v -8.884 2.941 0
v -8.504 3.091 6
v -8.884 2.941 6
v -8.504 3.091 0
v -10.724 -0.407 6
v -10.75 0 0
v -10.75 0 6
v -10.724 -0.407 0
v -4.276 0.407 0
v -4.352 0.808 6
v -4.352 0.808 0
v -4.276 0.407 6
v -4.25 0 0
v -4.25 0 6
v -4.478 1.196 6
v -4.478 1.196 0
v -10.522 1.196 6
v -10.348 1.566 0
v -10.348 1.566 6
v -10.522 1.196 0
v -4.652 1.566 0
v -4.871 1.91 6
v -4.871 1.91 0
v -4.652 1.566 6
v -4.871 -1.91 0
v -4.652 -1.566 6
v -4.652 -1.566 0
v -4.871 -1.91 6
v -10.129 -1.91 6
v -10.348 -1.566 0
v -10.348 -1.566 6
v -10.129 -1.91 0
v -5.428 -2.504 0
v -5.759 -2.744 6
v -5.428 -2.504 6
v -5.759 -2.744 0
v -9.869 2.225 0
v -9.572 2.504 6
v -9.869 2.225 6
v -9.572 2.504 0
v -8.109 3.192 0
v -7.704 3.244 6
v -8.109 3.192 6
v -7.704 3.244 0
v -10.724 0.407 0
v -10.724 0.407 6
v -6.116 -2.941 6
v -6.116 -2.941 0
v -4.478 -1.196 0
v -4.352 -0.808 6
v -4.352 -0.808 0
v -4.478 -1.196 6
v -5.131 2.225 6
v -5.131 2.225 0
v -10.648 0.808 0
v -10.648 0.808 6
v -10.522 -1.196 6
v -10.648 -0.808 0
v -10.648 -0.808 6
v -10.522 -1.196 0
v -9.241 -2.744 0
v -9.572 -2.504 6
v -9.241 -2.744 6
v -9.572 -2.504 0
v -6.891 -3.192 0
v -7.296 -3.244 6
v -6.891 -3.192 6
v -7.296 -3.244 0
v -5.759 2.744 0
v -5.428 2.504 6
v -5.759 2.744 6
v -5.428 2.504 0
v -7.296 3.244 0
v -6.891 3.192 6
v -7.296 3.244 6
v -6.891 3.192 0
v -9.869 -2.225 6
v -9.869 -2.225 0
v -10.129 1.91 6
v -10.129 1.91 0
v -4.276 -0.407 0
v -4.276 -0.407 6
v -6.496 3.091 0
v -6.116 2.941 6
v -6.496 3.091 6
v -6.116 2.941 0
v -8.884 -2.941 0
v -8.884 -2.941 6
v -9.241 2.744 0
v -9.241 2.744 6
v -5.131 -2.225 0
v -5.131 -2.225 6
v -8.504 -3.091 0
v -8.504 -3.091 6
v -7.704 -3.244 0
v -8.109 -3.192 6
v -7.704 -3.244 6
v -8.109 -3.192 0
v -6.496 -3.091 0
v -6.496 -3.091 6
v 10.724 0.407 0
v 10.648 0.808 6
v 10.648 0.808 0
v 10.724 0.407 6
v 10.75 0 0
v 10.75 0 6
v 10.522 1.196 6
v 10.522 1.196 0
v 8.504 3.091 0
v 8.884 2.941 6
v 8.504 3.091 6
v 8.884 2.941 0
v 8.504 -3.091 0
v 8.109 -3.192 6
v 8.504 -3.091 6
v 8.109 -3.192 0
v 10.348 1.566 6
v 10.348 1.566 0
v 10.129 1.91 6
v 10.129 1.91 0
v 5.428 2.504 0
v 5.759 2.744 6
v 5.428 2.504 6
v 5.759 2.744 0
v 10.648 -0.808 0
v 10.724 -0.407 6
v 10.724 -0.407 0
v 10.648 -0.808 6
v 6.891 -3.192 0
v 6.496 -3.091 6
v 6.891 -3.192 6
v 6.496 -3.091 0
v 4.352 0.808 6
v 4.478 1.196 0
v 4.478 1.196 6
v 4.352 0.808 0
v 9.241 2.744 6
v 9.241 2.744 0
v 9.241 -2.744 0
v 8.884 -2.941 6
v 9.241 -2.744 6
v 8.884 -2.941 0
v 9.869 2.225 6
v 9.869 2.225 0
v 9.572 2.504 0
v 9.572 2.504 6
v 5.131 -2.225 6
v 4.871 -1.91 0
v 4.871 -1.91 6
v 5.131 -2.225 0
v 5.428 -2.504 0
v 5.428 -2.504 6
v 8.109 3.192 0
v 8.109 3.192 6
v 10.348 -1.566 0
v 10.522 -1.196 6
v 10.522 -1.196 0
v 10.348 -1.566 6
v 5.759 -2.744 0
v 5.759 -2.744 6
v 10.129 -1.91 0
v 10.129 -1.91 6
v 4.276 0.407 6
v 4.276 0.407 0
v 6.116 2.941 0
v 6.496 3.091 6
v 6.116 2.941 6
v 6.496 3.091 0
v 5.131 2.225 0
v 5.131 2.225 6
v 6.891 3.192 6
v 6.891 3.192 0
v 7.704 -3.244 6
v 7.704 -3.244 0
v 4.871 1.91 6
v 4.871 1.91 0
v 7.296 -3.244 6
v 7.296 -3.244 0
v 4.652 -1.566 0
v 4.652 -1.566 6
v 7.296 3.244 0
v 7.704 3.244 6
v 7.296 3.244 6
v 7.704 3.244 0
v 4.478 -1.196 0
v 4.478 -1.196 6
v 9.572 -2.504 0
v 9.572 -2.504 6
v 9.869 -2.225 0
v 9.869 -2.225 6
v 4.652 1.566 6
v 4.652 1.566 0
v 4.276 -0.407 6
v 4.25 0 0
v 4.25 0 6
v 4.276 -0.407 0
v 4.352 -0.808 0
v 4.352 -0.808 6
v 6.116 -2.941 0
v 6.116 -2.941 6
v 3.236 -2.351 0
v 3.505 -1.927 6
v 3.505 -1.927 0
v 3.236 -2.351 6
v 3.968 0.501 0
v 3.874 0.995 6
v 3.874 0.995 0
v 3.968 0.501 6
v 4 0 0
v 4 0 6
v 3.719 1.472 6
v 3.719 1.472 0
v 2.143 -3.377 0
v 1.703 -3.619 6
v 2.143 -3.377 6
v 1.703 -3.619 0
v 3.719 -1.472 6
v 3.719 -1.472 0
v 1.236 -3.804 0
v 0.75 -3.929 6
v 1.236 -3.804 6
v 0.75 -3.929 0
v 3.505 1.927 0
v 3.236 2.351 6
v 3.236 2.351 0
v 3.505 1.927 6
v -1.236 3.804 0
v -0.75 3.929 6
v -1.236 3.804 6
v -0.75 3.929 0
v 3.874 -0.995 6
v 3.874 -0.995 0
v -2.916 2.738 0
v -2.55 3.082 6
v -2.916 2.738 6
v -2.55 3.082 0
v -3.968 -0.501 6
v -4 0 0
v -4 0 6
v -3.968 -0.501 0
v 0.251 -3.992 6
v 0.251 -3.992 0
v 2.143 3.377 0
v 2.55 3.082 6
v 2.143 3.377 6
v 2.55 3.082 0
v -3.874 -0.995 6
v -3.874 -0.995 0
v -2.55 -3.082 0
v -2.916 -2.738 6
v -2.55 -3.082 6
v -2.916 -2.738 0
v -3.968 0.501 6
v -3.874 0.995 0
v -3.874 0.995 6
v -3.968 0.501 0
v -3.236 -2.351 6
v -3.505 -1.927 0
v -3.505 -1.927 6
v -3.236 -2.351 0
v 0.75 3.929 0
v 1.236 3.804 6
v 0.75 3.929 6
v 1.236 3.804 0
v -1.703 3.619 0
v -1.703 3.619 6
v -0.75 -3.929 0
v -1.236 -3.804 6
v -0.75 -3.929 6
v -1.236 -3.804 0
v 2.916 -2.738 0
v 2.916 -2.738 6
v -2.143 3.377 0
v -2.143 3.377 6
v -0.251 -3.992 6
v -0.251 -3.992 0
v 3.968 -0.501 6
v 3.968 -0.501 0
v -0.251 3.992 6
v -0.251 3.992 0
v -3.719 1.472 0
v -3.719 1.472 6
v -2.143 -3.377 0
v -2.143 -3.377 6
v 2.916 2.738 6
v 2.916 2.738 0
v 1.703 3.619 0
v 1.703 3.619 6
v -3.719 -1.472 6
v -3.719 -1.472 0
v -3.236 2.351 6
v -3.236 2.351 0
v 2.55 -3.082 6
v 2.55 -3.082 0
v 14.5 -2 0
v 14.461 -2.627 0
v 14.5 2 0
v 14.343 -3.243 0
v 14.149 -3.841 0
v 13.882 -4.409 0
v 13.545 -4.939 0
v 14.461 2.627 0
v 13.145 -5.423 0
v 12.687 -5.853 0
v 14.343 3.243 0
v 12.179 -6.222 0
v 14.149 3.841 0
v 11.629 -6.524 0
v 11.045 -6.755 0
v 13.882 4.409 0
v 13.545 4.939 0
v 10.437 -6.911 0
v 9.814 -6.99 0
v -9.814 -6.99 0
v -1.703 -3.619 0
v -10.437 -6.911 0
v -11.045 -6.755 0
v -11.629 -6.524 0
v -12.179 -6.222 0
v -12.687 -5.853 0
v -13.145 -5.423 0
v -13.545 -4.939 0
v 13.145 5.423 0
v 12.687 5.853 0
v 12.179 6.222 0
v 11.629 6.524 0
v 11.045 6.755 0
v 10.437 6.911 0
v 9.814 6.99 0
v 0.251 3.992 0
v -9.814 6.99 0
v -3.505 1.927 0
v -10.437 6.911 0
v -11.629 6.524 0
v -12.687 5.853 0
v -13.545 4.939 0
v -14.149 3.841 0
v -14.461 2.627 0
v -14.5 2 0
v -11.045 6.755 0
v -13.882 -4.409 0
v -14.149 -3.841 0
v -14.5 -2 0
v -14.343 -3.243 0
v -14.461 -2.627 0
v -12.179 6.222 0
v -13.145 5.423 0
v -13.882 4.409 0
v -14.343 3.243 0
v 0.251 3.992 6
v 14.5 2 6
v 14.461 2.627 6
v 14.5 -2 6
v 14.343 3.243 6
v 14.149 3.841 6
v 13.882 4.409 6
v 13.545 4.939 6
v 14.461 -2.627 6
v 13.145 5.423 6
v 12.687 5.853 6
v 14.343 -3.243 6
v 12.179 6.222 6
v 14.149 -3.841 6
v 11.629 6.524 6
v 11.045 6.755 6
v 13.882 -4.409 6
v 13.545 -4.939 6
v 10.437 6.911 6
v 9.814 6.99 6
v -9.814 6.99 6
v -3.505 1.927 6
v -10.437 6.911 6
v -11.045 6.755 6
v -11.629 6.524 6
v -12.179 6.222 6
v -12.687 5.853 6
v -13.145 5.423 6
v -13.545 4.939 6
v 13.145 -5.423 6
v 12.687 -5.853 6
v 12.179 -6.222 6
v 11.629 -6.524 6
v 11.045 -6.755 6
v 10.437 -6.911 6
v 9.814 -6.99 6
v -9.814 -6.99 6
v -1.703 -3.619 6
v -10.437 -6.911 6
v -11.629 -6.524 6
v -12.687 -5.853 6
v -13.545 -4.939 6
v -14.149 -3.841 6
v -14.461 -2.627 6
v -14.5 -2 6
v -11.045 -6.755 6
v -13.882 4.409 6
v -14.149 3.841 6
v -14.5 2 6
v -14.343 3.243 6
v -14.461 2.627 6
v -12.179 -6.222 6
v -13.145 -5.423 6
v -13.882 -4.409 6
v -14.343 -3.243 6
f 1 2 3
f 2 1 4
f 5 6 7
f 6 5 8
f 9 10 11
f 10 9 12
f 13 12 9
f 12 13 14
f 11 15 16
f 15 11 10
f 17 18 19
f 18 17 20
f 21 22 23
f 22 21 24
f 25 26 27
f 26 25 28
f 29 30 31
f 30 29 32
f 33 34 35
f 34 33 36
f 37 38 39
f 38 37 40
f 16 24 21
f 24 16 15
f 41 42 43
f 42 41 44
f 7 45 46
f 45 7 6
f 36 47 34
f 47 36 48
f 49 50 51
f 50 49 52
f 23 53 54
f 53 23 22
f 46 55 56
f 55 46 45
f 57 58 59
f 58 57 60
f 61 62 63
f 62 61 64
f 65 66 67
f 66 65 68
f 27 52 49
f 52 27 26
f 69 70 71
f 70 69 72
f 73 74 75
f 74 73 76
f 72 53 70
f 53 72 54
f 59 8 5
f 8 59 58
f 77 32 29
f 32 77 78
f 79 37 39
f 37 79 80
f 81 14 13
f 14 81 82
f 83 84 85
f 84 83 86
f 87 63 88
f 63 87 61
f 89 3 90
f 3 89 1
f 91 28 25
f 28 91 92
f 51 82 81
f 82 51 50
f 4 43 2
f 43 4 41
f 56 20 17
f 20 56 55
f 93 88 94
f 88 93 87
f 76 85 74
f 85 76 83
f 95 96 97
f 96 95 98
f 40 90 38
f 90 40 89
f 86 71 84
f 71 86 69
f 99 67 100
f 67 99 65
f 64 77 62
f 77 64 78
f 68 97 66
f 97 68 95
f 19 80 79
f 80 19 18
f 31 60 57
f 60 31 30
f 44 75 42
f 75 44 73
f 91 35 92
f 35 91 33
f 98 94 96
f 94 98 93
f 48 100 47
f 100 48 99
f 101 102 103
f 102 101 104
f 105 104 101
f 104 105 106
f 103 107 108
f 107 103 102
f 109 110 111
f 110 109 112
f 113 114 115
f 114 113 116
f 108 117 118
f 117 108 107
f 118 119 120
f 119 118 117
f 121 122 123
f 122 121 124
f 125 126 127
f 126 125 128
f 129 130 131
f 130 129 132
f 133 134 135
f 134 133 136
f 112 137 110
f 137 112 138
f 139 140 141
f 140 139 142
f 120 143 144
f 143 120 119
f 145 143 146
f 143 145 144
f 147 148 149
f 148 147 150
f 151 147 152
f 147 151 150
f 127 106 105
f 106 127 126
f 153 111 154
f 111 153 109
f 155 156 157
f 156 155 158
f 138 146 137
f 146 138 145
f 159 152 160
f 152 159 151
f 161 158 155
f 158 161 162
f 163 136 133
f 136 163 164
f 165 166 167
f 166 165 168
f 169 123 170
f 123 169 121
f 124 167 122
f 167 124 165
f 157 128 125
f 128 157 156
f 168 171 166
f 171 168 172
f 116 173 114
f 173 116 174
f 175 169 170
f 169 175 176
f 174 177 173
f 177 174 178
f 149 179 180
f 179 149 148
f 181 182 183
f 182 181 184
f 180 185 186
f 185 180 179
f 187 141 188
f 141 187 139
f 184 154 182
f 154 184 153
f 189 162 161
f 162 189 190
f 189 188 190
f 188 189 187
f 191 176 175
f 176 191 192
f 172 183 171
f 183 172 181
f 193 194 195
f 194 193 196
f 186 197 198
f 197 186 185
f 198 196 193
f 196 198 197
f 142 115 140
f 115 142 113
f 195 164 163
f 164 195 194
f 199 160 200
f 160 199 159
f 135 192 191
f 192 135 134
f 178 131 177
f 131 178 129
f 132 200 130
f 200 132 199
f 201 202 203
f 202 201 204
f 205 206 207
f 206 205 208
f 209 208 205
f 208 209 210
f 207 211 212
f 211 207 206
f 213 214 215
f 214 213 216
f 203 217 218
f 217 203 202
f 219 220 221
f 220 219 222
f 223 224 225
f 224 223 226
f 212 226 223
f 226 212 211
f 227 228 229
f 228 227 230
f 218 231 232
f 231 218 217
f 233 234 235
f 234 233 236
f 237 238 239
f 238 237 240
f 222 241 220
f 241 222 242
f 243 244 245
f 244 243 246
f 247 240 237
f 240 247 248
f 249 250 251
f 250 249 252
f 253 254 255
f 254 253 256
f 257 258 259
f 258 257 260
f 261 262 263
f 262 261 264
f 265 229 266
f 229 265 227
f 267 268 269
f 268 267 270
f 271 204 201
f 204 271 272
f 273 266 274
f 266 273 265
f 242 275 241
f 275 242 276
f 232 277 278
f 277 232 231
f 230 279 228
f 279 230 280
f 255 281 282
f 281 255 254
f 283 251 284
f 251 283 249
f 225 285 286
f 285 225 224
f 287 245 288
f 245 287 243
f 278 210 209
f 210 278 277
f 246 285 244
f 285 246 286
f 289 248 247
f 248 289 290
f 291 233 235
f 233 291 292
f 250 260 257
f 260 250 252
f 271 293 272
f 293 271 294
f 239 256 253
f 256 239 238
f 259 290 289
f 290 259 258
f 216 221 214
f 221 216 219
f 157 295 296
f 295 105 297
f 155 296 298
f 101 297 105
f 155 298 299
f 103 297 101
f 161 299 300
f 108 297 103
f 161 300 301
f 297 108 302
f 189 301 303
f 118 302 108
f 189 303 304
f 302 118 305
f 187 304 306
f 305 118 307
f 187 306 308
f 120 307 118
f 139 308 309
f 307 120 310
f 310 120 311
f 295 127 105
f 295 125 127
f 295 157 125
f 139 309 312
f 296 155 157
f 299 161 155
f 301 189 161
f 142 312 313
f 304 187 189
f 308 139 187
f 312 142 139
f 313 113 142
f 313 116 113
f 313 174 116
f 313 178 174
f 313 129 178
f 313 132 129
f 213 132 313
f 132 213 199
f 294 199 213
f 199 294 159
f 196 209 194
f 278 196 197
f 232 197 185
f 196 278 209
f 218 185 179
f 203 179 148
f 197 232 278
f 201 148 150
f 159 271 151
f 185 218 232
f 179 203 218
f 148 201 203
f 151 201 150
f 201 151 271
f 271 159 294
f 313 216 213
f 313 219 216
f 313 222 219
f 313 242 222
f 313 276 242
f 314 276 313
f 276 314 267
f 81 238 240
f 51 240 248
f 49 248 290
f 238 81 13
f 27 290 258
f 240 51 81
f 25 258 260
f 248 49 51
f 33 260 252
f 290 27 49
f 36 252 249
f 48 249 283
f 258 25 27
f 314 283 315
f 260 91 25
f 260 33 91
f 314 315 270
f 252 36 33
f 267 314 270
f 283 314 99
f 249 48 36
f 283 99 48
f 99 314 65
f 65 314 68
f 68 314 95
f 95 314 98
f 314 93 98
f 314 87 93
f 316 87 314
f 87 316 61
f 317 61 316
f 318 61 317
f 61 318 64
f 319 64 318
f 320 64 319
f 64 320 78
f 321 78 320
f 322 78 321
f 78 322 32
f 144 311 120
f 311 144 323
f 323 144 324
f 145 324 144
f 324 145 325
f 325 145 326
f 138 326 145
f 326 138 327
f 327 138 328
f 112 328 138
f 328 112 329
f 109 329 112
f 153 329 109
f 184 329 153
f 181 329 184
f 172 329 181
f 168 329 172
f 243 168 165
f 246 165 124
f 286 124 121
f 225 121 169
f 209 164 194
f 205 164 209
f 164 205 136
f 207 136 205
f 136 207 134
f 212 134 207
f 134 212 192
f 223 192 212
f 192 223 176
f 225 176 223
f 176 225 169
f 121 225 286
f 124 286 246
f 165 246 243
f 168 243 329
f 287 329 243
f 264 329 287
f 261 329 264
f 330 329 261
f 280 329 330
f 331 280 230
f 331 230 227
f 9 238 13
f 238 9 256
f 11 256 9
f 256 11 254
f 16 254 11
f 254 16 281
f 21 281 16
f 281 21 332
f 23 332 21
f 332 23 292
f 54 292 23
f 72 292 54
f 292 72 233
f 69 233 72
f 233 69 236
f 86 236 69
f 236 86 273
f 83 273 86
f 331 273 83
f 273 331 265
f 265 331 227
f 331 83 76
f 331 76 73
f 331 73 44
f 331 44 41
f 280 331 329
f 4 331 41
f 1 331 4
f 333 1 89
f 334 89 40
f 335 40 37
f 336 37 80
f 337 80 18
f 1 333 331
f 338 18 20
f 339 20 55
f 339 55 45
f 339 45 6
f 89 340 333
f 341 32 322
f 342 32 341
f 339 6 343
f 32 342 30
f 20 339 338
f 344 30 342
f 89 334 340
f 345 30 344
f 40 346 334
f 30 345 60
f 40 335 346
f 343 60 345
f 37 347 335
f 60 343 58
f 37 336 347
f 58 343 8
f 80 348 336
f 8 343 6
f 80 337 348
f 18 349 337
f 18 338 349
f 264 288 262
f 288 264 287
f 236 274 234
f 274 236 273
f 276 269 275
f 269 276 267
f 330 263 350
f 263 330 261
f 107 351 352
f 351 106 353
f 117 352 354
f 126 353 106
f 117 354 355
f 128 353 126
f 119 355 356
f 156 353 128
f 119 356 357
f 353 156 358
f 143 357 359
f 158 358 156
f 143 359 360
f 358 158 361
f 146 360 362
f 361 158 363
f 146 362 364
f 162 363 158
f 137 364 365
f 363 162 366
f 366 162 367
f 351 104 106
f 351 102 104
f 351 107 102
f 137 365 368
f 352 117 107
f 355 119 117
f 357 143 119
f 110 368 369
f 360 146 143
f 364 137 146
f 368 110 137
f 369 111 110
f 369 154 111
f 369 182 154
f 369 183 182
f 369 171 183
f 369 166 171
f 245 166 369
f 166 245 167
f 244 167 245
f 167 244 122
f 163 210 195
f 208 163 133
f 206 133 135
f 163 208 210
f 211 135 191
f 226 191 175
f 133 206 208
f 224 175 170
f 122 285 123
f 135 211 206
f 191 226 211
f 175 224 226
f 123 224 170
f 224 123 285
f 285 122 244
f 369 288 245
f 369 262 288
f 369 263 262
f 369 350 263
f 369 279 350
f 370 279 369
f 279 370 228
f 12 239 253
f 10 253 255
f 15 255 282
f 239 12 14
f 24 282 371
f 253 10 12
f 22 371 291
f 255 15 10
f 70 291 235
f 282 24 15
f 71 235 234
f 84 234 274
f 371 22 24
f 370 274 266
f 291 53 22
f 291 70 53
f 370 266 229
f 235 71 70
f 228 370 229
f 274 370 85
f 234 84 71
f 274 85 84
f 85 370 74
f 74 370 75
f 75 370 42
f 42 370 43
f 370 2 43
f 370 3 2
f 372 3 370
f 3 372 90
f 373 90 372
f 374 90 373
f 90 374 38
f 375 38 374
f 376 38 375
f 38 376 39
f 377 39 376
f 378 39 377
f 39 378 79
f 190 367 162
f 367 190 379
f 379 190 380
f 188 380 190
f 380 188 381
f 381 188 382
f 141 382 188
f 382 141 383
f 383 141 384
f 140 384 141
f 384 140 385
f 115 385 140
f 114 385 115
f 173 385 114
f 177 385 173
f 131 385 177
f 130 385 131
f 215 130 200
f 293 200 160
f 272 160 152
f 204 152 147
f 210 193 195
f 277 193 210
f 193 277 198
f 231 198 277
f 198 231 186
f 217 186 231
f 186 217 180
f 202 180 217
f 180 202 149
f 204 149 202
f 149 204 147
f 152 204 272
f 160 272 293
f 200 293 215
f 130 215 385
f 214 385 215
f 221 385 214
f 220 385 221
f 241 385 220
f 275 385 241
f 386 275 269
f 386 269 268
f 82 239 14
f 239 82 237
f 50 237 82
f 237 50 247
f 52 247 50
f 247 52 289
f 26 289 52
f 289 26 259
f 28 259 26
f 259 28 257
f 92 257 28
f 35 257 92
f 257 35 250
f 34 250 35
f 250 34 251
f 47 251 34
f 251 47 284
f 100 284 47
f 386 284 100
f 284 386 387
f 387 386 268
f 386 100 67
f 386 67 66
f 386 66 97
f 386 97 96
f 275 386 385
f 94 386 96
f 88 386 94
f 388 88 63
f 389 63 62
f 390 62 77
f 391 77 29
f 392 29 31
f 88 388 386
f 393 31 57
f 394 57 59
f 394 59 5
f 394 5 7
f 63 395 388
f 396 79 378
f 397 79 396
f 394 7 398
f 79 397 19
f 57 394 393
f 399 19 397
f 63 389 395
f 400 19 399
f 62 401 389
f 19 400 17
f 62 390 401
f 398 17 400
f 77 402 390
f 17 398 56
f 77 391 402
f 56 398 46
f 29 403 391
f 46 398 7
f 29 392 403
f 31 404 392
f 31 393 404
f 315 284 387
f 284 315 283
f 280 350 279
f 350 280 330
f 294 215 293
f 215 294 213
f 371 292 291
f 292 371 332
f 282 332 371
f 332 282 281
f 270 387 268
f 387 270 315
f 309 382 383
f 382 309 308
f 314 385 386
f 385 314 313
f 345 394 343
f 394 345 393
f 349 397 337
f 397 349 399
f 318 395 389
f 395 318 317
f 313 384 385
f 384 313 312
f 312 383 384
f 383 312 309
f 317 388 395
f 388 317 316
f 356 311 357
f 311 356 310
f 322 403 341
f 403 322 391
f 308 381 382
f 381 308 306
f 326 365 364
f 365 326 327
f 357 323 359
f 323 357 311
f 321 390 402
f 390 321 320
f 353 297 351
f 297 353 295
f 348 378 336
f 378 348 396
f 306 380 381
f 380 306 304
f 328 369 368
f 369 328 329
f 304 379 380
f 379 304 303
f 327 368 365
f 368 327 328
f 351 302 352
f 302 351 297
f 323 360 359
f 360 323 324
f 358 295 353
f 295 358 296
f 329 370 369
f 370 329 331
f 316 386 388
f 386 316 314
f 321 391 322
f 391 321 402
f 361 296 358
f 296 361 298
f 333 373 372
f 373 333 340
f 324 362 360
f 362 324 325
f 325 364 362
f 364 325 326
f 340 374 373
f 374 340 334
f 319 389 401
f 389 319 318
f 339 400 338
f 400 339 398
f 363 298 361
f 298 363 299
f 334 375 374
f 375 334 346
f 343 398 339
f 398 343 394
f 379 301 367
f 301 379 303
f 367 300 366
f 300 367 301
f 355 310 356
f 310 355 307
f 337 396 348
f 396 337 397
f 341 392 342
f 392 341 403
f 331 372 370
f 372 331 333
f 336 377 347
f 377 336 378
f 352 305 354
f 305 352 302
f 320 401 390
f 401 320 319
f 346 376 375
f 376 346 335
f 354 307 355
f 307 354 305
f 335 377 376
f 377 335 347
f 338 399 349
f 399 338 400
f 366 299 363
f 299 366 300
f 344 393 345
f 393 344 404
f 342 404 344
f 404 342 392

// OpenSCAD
$fn = 50;


difference() {
	union() {
		hull() {
			translate(v = [-9.5000000000, 2.0000000000, 0]) {
				cylinder(h = 6, r = 5);
			}
			translate(v = [9.5000000000, 2.0000000000, 0]) {
				cylinder(h = 6, r = 5);
			}
			translate(v = [-9.5000000000, -2.0000000000, 0]) {
				cylinder(h = 6, r = 5);
			}
			translate(v = [9.5000000000, -2.0000000000, 0]) {
				cylinder(h = 6, r = 5);
			}
		}
	}
	union() {
		#translate(v = [-7.5000000000, 0.0000000000, -100.0000000000]) {
			cylinder(h = 200, r = 3.2500000000);
		}
		#translate(v = [-7.5000000000, 0.0000000000, -100.0000000000]) {
			cylinder(h = 200, r = 3.2500000000);
		}
		#translate(v = [7.5000000000, 0.0000000000, -100.0000000000]) {
			cylinder(h = 200, r = 3.2500000000);
		}
		#translate(v = [7.5000000000, 0.0000000000, -100.0000000000]) {
			cylinder(h = 200, r = 3.2500000000);
		}
		#cylinder(h = 6, r = 4.0000000000);
	}
}
